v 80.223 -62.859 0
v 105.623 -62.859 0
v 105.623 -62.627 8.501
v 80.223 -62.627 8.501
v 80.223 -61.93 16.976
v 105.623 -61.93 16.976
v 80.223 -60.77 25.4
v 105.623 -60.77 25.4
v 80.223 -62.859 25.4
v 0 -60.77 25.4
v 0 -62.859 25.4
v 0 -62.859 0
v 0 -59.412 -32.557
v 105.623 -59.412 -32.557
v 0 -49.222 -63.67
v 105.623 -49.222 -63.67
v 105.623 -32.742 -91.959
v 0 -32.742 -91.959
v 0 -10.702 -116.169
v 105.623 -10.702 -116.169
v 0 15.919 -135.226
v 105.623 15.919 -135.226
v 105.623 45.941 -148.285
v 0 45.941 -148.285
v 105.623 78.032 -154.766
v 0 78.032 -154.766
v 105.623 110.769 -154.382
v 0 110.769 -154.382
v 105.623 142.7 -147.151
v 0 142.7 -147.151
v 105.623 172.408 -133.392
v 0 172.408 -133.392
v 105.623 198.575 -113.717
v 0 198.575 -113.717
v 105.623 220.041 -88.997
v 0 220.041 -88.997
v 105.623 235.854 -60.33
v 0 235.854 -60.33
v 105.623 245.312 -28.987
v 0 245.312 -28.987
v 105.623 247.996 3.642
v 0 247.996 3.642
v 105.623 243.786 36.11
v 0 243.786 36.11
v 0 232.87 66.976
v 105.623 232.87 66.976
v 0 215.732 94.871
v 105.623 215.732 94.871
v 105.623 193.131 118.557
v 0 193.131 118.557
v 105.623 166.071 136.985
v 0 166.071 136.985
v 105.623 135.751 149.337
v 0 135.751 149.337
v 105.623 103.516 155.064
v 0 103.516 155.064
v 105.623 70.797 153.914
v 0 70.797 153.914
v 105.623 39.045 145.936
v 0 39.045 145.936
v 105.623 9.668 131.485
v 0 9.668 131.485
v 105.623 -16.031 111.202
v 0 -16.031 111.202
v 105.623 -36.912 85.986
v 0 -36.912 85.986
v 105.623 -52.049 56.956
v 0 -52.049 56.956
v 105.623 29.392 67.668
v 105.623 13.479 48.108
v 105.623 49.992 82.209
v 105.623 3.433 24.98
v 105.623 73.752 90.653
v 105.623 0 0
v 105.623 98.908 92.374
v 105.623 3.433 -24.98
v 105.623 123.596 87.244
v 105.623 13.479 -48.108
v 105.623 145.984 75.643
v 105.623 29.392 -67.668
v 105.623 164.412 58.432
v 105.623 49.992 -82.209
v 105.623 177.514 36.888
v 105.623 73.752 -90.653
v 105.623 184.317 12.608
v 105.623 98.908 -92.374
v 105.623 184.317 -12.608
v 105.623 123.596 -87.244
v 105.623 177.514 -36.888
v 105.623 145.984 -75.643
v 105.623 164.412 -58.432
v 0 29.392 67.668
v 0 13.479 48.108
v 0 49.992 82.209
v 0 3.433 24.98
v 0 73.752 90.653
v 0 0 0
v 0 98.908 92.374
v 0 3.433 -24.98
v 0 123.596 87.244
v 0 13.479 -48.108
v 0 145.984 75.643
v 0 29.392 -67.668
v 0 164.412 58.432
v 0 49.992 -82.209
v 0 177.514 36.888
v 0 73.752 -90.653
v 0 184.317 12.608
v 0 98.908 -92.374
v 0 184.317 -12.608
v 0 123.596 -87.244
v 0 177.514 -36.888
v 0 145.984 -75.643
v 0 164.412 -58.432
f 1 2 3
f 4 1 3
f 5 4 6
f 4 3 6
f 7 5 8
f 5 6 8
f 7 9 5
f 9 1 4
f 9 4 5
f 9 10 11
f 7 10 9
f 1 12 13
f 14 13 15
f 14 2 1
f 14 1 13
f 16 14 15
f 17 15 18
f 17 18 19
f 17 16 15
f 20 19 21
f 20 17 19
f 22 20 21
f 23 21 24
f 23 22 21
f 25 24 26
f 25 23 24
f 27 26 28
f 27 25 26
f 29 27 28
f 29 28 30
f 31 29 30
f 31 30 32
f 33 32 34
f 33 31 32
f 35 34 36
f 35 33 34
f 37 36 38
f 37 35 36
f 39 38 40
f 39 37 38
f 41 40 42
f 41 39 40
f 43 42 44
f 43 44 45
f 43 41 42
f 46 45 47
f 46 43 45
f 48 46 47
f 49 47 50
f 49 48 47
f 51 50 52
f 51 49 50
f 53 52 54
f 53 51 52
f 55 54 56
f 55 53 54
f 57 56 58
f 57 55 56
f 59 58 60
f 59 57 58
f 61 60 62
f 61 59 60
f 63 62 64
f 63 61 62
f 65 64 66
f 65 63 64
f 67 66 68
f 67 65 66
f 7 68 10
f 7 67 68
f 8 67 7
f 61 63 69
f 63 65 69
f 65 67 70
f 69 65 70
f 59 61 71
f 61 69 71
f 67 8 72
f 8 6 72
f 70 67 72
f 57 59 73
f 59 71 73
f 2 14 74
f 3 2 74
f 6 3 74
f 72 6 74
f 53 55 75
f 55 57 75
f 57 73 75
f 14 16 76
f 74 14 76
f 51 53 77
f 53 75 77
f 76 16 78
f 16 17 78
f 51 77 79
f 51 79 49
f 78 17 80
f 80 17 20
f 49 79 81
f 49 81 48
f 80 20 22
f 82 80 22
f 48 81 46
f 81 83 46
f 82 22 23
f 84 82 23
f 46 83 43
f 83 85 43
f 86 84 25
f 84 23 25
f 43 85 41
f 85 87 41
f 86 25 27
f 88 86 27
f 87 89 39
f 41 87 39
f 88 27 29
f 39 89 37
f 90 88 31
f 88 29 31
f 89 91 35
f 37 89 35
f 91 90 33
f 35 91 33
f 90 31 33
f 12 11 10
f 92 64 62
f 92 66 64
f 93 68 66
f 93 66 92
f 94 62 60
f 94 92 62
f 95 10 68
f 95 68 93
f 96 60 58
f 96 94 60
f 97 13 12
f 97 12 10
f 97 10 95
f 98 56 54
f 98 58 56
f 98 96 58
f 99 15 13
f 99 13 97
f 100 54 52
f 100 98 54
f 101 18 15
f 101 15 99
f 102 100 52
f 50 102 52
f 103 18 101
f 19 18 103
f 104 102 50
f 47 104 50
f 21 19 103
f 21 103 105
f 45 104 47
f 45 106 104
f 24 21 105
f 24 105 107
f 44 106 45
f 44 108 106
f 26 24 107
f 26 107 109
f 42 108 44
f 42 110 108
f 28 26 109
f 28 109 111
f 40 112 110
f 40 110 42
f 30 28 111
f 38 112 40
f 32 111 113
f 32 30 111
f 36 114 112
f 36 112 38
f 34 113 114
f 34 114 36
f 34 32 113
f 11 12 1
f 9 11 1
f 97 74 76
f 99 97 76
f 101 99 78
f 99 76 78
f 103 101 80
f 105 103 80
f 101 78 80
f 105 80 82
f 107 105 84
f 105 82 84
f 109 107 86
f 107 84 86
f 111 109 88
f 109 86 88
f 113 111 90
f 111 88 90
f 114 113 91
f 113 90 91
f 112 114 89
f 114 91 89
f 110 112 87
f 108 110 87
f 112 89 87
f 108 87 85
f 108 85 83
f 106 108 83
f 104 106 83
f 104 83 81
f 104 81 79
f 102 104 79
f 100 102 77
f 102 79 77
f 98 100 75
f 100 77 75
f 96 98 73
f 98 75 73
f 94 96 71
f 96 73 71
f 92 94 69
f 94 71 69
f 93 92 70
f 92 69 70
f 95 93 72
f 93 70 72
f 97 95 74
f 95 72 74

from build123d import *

# Parameters (mm, degrees)
F0_W      = 105.6232824922
F0_H      = 62.8593713045
F1_DEPTH  = 25.4
F1_FACE_W = 105.6232824922
F1_FACE_H = 62.8593713045
F5_DEPTH  = 25.4


with BuildPart() as f1:
    # F0 (on Top) → F1 (new body)
    with BuildSketch(Plane.XY):
        with Locations((52.8116412461, -31.4296856523)):
            Rectangle(F0_W, F0_H)
    extrude(amount=F1_DEPTH)

    # F1_face (on face) → F3 (revolve)
    with BuildSketch(Plane(origin=(52.8116412461, -31.4296856523, 0), x_dir=(1, 0, 0), z_dir=(0, 0, -1))):
        Rectangle(F1_FACE_W, F1_FACE_H)
    revolve(axis=Axis((0, 92.5896167755, 0), (1, 0, 0)))

    # F4 (on face) → F5 (cut)
    with BuildSketch(Plane.YZ.offset(105.6232824922)):
        with BuildLine():
            ThreePointArc((-62.8593713045, 0), (-62.3361935892, 12.742887347), (-60.7701820477, 25.4))
            Line((-60.7701820477, 25.4), (-62.8593713045, 25.4))
            Line((-62.8593713045, 25.4), (-62.8593713045, 0))
        make_face()
    extrude(amount=-F5_DEPTH, mode=Mode.SUBTRACT)


solid = f1.part
